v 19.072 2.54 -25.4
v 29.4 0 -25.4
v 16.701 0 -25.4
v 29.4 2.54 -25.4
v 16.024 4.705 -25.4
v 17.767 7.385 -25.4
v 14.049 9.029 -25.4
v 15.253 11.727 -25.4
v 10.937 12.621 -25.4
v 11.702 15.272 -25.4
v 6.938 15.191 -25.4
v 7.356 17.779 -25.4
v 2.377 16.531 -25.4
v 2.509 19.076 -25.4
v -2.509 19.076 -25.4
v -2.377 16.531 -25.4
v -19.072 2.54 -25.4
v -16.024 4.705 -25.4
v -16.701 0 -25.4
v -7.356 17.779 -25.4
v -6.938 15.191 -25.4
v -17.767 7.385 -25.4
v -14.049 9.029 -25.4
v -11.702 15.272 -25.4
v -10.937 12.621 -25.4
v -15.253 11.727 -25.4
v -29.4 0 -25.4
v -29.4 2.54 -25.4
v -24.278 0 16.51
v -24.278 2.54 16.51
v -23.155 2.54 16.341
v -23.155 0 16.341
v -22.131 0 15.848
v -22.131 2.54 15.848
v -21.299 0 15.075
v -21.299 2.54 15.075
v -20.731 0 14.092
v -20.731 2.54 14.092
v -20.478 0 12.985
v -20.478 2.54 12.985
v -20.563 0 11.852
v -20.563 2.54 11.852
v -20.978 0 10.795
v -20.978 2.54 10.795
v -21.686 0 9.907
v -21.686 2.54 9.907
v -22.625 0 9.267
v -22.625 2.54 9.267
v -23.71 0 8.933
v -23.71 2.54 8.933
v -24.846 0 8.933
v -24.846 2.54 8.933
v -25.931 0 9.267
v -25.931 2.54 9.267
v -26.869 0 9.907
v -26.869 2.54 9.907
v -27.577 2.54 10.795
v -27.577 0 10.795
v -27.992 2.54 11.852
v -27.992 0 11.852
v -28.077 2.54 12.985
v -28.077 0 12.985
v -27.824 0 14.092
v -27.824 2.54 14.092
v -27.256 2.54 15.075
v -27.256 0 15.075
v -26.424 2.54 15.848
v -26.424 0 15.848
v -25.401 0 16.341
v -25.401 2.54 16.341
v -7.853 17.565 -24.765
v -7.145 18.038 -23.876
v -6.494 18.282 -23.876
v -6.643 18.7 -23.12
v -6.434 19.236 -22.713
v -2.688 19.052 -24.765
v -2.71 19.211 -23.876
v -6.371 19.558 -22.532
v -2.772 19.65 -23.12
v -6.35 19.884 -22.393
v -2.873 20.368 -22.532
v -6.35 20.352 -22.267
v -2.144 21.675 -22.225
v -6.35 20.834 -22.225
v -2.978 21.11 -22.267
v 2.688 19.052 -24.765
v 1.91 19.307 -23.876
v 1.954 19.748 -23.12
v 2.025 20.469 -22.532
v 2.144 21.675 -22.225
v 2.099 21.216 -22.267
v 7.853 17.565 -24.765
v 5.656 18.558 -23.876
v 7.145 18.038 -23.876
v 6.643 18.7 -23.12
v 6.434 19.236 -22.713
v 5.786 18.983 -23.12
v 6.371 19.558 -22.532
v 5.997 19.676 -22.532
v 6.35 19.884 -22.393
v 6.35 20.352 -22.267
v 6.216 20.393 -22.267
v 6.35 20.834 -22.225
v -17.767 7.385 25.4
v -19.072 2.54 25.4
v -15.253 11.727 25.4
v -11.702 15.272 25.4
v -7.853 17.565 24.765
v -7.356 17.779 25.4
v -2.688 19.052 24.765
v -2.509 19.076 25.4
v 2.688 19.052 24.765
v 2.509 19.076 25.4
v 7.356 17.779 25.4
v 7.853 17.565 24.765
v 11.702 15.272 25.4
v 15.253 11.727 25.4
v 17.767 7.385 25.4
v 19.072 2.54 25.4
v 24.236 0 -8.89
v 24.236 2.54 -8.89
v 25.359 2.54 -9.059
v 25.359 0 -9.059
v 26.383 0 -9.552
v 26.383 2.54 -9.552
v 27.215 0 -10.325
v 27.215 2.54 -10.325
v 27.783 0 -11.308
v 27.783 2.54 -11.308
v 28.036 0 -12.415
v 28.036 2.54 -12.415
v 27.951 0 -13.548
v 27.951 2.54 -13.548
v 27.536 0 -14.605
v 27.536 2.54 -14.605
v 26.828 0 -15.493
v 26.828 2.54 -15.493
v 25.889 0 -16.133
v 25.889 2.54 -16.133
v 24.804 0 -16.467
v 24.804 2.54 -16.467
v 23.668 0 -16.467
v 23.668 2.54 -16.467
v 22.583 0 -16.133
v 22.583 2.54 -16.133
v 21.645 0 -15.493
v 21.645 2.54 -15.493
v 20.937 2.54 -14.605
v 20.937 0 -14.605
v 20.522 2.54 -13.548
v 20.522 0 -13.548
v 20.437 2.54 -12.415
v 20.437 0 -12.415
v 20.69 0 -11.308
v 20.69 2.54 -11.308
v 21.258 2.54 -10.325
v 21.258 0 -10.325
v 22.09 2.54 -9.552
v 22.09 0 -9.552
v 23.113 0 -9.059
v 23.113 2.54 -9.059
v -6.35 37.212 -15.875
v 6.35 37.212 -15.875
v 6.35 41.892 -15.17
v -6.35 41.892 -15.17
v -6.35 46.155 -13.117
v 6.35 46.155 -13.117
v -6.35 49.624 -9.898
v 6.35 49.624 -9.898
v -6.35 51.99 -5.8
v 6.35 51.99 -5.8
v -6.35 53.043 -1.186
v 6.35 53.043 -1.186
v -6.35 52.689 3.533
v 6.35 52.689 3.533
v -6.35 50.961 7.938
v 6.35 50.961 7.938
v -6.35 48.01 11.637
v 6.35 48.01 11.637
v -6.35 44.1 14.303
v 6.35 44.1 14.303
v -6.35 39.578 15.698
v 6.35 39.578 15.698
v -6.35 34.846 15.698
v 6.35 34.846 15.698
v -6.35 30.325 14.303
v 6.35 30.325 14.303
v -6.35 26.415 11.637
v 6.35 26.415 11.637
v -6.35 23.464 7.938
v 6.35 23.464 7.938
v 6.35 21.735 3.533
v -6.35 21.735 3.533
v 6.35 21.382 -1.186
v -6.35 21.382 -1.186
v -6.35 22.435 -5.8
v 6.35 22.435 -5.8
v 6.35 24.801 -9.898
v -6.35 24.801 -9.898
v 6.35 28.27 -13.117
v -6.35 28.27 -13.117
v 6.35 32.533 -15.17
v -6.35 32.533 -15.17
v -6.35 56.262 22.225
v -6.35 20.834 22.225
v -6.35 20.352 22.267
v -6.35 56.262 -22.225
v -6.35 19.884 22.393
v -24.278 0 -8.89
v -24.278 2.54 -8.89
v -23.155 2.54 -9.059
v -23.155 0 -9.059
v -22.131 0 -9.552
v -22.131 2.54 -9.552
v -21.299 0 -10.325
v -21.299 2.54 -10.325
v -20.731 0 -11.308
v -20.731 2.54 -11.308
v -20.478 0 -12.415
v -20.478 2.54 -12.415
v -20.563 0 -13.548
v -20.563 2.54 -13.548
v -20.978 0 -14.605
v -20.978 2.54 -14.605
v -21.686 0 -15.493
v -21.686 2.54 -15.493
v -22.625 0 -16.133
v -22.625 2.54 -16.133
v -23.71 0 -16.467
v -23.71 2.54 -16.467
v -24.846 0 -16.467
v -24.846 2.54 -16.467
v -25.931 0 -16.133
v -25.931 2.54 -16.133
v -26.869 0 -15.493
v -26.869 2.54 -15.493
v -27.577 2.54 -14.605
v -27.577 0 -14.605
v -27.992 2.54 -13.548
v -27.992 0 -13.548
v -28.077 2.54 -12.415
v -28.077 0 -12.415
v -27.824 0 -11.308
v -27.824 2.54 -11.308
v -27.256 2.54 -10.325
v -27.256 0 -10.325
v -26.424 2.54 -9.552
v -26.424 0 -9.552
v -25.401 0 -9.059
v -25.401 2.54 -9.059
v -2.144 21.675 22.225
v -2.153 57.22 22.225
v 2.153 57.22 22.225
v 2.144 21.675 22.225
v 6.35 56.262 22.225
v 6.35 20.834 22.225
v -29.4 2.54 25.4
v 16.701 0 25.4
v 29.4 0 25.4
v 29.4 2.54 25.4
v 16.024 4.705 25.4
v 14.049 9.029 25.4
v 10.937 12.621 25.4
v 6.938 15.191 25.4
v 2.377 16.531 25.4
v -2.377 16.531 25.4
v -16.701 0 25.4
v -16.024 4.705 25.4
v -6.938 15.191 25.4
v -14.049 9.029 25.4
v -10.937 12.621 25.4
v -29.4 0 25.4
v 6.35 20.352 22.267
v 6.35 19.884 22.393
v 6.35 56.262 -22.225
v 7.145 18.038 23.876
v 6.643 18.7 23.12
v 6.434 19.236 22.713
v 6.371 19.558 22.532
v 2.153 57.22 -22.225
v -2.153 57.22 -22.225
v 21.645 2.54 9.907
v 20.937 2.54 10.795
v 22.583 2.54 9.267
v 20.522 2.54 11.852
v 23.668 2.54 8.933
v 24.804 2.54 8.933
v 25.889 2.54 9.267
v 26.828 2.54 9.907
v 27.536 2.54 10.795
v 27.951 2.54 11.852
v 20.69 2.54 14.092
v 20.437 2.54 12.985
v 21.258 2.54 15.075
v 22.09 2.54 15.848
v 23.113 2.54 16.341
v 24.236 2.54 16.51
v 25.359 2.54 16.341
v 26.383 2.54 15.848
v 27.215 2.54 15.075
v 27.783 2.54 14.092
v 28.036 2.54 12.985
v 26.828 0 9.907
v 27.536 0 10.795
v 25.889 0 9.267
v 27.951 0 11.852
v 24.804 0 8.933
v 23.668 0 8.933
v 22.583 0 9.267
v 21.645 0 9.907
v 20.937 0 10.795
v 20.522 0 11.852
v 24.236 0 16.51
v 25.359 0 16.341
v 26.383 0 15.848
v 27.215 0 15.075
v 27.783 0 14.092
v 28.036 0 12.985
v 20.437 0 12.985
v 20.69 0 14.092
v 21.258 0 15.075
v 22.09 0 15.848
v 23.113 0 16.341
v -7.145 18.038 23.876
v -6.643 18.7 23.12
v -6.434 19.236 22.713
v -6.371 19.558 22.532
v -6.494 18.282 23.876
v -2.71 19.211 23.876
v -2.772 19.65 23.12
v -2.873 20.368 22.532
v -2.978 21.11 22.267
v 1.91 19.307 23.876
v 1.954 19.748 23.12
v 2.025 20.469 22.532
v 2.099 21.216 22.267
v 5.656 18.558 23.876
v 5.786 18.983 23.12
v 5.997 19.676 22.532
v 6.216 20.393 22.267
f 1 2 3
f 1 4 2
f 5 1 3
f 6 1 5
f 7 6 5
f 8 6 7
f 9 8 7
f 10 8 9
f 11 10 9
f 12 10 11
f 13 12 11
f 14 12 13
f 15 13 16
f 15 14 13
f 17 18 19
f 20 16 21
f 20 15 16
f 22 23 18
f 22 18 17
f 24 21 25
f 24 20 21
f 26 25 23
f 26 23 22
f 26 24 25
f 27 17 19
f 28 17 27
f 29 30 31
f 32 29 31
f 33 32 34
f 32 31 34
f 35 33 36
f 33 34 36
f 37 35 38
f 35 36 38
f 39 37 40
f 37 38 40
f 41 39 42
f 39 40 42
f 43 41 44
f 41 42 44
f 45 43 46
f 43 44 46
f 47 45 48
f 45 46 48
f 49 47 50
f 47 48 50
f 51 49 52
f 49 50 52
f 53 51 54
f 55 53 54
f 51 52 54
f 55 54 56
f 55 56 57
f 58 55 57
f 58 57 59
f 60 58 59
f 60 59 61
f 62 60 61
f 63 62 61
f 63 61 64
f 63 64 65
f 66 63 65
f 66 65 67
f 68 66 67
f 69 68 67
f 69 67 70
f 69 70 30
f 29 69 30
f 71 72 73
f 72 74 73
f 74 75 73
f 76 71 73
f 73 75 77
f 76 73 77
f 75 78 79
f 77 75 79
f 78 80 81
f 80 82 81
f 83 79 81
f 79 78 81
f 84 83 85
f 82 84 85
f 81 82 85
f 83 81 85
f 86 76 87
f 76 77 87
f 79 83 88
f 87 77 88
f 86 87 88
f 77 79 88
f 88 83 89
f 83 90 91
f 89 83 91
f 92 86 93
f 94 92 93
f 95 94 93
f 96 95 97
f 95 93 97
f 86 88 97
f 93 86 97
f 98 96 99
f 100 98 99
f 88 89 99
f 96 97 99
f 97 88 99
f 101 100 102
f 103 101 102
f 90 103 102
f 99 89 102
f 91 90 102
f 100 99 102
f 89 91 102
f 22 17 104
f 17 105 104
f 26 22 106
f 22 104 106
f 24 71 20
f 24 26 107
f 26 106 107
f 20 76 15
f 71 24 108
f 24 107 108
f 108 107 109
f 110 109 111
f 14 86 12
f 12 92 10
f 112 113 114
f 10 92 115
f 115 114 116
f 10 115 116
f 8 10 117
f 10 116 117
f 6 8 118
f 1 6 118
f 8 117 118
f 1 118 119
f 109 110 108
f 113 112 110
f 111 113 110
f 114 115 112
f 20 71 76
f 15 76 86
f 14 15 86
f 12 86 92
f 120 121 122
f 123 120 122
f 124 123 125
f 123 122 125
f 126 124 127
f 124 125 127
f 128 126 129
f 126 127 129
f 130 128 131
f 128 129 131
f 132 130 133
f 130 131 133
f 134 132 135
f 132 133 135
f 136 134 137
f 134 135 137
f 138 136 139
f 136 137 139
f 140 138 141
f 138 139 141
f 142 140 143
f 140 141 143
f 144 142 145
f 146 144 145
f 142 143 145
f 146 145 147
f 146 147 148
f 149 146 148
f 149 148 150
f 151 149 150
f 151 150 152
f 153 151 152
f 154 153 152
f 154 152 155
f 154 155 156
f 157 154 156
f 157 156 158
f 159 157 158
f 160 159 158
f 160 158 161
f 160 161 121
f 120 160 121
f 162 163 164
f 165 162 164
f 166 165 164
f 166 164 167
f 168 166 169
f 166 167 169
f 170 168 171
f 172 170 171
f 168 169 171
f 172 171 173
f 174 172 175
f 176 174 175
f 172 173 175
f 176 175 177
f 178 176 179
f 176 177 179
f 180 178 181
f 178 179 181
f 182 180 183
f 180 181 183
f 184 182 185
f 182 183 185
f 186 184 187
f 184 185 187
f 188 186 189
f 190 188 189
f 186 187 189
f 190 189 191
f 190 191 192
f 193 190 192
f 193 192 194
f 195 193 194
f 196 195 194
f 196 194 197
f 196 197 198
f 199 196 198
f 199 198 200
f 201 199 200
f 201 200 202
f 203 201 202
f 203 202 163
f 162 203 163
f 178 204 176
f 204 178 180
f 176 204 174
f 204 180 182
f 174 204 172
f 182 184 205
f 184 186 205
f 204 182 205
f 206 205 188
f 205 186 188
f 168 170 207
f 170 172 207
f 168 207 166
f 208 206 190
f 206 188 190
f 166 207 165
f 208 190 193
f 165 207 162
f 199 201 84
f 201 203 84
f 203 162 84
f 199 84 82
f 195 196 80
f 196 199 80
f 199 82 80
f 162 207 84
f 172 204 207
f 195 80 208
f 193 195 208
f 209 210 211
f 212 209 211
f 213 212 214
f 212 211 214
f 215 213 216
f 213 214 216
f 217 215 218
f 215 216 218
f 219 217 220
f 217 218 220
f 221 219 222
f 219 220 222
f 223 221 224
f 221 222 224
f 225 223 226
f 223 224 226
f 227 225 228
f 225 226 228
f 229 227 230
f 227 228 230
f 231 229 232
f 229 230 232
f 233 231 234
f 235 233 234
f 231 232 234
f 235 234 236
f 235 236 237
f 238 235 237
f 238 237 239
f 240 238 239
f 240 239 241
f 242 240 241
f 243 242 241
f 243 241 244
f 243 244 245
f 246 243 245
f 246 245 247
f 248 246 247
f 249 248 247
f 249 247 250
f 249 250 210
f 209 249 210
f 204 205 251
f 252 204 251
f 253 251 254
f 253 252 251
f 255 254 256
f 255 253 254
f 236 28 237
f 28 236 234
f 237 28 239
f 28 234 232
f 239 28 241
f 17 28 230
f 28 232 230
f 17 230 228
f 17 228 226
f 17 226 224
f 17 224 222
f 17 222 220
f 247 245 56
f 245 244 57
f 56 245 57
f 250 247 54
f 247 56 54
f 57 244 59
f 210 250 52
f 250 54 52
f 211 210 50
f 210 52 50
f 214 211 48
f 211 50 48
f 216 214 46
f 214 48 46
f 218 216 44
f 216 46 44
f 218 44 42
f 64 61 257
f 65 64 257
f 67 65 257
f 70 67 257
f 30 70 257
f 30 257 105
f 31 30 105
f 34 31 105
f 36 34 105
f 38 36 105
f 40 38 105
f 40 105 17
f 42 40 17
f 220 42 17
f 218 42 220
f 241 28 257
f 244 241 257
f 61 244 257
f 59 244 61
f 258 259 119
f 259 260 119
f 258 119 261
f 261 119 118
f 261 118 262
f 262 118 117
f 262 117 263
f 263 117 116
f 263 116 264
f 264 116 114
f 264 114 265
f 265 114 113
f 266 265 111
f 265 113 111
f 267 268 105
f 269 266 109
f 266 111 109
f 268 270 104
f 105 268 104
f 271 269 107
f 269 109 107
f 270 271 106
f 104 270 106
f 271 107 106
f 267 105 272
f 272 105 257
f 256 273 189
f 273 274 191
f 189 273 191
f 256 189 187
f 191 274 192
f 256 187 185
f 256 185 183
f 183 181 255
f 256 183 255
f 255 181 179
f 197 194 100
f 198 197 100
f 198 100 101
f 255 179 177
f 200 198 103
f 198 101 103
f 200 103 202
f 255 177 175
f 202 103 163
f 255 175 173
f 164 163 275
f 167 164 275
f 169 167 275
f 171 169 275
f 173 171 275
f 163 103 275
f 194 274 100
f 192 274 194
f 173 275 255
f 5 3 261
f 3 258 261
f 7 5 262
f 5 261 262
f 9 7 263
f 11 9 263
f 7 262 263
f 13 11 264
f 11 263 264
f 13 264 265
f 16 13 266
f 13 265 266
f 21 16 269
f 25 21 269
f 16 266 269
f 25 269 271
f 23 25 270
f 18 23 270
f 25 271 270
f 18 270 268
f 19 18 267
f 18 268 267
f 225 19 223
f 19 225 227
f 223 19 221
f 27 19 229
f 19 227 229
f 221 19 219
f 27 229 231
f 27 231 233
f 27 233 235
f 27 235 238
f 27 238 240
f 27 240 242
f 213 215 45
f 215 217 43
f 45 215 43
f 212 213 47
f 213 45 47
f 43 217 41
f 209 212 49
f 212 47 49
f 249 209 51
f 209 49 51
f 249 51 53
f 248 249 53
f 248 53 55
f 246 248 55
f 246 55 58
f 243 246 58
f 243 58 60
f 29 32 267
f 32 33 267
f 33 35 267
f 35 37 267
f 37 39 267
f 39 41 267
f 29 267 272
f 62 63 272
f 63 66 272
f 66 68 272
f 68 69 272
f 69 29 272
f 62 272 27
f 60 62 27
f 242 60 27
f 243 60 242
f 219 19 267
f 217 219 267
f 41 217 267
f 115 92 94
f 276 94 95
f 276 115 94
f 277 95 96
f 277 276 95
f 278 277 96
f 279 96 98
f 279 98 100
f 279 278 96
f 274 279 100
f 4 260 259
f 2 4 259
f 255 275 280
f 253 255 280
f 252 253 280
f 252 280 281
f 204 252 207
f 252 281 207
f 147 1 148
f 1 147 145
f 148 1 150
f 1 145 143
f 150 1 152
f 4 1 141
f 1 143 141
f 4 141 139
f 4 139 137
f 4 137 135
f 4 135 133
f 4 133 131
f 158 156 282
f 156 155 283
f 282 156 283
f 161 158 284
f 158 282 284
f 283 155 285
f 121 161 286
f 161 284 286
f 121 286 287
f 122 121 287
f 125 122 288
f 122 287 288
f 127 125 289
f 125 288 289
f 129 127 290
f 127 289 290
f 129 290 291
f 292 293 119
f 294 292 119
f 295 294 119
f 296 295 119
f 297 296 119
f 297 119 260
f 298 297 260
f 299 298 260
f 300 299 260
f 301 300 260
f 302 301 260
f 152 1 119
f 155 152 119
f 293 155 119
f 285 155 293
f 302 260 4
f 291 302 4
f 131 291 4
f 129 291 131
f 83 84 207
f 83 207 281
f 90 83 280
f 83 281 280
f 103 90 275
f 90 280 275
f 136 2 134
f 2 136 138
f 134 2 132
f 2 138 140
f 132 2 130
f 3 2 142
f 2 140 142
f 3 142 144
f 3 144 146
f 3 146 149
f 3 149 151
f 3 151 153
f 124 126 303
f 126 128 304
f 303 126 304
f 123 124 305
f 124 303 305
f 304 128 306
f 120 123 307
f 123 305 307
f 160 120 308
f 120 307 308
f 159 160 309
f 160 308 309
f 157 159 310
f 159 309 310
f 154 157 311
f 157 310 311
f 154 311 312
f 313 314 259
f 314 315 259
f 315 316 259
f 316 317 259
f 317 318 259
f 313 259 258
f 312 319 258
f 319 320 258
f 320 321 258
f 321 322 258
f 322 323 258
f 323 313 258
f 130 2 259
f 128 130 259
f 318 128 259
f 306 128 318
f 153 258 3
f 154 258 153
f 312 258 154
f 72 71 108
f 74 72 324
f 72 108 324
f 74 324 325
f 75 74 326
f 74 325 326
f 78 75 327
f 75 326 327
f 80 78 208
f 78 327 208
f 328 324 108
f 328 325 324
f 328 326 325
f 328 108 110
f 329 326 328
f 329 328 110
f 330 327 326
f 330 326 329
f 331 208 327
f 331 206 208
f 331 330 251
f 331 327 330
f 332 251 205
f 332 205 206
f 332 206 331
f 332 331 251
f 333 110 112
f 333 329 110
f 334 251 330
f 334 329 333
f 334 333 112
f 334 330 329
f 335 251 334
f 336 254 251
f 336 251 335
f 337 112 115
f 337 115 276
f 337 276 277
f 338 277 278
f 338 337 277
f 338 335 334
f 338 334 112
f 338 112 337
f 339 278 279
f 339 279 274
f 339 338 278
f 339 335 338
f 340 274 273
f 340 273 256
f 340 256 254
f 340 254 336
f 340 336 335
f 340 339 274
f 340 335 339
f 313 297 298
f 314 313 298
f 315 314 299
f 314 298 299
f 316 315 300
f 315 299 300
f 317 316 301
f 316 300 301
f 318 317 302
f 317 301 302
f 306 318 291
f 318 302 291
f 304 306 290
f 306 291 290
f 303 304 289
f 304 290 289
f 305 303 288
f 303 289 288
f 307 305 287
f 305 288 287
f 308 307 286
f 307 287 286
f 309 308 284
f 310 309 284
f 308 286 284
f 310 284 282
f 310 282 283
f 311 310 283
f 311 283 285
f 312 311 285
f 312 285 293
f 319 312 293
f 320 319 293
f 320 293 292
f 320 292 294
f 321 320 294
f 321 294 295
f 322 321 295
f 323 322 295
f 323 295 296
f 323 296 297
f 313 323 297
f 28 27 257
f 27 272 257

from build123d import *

# Parameters (mm, degrees)
EXTRUDE_THIN1_DEPTH = 25.4
SKETCH2_R           = 3.81
CUT_EXTRUDE1_DEPTH  = 10.922
BOSS_EXTRUDE1_START = -22.225
BOSS_EXTRUDE1_DEPTH = 44.45
SKETCH4_R           = 15.875
CUT_EXTRUDE2_DEPTH  = 38.1
FILLET1_R           = 2.54


# Read off the part's stored shape, not the designer's step: Boss-Extrude1
with BuildPart() as part:
    # Sketch1 → Extrude-Thin1 (new, symmetric)
    with BuildSketch(Plane.XY):
        with BuildLine():
            Line((29.4005, 0), (16.7005, 0))
            ThreePointArc((16.7005, 0), (0, 16.7005), (-16.7005, 0))
            Line((-16.7005, 0), (-29.4005, 0))
            Line((-29.4005, 0), (-29.4005, 2.54))
            Line((-29.4005, 2.54), (-19.07210634, 2.54))
            ThreePointArc((-19.07210634, 2.54), (0, 19.2405), (19.07210634, 2.54))
            Line((19.07210634, 2.54), (29.4005, 2.54))
            Line((29.4005, 2.54), (29.4005, 0))
        make_face()
    extrude(amount=EXTRUDE_THIN1_DEPTH, both=True)

    # Sketch2 → Cut-Extrude1 (cut)
    with BuildSketch(Plane(origin=(0, 2.54, 0), x_dir=(1, 0, 0), z_dir=(0, 1, 0))):
        with Locations(Location((24.23630317, -12.7, 0), (0, 0, 270))):
            Circle(SKETCH2_R)
        with Locations(Location((24.23630317, 12.7, 0), (0, 0, 270))):
            Circle(SKETCH2_R)
        with Locations(Location((-24.27769683, 12.7, 0), (0, 0, 270))):
            Circle(SKETCH2_R)
        with Locations(Location((-24.27769683, -12.7, 0), (0, 0, 270))):
            Circle(SKETCH2_R)
    extrude(amount=-CUT_EXTRUDE1_DEPTH, mode=Mode.SUBTRACT)

    # Boss-Extrude1 outline → Boss-Extrude1 (add)
    with BuildSketch(Plane.XY.offset(BOSS_EXTRUDE1_START)):
        with BuildLine():
            ThreePointArc((6.35, 56.262443124), (0, 57.3405), (-6.35, 56.262443124))
            Line((-6.35, 56.262443124), (-6.35, 18.162443124))
            ThreePointArc((-6.35, 18.162443124), (0, 19.2405), (6.35, 18.162443124))
            Line((6.35, 18.162443124), (6.35, 56.262443124))
        make_face()
    extrude(amount=BOSS_EXTRUDE1_DEPTH)

    # Sketch4 → Cut-Extrude2 (cut)
    with BuildSketch(Plane(origin=(6.35, 0, 0), x_dir=(0, 0, -1), z_dir=(1, 0, 0))):
        with Locations((0, 37.212443124)):
            Circle(SKETCH4_R)
    extrude(amount=-CUT_EXTRUDE2_DEPTH, mode=Mode.SUBTRACT)

    # Fillet1
    fillet1_edges = [part.edges().sort_by_distance(p)[0] for p in [
        (-6.35, 18.162443124, 0),
        (0, 19.2405, 22.225),
        (6.35, 18.162443124, 0),
        (0, 19.2405, -22.225),
    ]]
    fillet(fillet1_edges, radius=FILLET1_R)


solid = part.part
